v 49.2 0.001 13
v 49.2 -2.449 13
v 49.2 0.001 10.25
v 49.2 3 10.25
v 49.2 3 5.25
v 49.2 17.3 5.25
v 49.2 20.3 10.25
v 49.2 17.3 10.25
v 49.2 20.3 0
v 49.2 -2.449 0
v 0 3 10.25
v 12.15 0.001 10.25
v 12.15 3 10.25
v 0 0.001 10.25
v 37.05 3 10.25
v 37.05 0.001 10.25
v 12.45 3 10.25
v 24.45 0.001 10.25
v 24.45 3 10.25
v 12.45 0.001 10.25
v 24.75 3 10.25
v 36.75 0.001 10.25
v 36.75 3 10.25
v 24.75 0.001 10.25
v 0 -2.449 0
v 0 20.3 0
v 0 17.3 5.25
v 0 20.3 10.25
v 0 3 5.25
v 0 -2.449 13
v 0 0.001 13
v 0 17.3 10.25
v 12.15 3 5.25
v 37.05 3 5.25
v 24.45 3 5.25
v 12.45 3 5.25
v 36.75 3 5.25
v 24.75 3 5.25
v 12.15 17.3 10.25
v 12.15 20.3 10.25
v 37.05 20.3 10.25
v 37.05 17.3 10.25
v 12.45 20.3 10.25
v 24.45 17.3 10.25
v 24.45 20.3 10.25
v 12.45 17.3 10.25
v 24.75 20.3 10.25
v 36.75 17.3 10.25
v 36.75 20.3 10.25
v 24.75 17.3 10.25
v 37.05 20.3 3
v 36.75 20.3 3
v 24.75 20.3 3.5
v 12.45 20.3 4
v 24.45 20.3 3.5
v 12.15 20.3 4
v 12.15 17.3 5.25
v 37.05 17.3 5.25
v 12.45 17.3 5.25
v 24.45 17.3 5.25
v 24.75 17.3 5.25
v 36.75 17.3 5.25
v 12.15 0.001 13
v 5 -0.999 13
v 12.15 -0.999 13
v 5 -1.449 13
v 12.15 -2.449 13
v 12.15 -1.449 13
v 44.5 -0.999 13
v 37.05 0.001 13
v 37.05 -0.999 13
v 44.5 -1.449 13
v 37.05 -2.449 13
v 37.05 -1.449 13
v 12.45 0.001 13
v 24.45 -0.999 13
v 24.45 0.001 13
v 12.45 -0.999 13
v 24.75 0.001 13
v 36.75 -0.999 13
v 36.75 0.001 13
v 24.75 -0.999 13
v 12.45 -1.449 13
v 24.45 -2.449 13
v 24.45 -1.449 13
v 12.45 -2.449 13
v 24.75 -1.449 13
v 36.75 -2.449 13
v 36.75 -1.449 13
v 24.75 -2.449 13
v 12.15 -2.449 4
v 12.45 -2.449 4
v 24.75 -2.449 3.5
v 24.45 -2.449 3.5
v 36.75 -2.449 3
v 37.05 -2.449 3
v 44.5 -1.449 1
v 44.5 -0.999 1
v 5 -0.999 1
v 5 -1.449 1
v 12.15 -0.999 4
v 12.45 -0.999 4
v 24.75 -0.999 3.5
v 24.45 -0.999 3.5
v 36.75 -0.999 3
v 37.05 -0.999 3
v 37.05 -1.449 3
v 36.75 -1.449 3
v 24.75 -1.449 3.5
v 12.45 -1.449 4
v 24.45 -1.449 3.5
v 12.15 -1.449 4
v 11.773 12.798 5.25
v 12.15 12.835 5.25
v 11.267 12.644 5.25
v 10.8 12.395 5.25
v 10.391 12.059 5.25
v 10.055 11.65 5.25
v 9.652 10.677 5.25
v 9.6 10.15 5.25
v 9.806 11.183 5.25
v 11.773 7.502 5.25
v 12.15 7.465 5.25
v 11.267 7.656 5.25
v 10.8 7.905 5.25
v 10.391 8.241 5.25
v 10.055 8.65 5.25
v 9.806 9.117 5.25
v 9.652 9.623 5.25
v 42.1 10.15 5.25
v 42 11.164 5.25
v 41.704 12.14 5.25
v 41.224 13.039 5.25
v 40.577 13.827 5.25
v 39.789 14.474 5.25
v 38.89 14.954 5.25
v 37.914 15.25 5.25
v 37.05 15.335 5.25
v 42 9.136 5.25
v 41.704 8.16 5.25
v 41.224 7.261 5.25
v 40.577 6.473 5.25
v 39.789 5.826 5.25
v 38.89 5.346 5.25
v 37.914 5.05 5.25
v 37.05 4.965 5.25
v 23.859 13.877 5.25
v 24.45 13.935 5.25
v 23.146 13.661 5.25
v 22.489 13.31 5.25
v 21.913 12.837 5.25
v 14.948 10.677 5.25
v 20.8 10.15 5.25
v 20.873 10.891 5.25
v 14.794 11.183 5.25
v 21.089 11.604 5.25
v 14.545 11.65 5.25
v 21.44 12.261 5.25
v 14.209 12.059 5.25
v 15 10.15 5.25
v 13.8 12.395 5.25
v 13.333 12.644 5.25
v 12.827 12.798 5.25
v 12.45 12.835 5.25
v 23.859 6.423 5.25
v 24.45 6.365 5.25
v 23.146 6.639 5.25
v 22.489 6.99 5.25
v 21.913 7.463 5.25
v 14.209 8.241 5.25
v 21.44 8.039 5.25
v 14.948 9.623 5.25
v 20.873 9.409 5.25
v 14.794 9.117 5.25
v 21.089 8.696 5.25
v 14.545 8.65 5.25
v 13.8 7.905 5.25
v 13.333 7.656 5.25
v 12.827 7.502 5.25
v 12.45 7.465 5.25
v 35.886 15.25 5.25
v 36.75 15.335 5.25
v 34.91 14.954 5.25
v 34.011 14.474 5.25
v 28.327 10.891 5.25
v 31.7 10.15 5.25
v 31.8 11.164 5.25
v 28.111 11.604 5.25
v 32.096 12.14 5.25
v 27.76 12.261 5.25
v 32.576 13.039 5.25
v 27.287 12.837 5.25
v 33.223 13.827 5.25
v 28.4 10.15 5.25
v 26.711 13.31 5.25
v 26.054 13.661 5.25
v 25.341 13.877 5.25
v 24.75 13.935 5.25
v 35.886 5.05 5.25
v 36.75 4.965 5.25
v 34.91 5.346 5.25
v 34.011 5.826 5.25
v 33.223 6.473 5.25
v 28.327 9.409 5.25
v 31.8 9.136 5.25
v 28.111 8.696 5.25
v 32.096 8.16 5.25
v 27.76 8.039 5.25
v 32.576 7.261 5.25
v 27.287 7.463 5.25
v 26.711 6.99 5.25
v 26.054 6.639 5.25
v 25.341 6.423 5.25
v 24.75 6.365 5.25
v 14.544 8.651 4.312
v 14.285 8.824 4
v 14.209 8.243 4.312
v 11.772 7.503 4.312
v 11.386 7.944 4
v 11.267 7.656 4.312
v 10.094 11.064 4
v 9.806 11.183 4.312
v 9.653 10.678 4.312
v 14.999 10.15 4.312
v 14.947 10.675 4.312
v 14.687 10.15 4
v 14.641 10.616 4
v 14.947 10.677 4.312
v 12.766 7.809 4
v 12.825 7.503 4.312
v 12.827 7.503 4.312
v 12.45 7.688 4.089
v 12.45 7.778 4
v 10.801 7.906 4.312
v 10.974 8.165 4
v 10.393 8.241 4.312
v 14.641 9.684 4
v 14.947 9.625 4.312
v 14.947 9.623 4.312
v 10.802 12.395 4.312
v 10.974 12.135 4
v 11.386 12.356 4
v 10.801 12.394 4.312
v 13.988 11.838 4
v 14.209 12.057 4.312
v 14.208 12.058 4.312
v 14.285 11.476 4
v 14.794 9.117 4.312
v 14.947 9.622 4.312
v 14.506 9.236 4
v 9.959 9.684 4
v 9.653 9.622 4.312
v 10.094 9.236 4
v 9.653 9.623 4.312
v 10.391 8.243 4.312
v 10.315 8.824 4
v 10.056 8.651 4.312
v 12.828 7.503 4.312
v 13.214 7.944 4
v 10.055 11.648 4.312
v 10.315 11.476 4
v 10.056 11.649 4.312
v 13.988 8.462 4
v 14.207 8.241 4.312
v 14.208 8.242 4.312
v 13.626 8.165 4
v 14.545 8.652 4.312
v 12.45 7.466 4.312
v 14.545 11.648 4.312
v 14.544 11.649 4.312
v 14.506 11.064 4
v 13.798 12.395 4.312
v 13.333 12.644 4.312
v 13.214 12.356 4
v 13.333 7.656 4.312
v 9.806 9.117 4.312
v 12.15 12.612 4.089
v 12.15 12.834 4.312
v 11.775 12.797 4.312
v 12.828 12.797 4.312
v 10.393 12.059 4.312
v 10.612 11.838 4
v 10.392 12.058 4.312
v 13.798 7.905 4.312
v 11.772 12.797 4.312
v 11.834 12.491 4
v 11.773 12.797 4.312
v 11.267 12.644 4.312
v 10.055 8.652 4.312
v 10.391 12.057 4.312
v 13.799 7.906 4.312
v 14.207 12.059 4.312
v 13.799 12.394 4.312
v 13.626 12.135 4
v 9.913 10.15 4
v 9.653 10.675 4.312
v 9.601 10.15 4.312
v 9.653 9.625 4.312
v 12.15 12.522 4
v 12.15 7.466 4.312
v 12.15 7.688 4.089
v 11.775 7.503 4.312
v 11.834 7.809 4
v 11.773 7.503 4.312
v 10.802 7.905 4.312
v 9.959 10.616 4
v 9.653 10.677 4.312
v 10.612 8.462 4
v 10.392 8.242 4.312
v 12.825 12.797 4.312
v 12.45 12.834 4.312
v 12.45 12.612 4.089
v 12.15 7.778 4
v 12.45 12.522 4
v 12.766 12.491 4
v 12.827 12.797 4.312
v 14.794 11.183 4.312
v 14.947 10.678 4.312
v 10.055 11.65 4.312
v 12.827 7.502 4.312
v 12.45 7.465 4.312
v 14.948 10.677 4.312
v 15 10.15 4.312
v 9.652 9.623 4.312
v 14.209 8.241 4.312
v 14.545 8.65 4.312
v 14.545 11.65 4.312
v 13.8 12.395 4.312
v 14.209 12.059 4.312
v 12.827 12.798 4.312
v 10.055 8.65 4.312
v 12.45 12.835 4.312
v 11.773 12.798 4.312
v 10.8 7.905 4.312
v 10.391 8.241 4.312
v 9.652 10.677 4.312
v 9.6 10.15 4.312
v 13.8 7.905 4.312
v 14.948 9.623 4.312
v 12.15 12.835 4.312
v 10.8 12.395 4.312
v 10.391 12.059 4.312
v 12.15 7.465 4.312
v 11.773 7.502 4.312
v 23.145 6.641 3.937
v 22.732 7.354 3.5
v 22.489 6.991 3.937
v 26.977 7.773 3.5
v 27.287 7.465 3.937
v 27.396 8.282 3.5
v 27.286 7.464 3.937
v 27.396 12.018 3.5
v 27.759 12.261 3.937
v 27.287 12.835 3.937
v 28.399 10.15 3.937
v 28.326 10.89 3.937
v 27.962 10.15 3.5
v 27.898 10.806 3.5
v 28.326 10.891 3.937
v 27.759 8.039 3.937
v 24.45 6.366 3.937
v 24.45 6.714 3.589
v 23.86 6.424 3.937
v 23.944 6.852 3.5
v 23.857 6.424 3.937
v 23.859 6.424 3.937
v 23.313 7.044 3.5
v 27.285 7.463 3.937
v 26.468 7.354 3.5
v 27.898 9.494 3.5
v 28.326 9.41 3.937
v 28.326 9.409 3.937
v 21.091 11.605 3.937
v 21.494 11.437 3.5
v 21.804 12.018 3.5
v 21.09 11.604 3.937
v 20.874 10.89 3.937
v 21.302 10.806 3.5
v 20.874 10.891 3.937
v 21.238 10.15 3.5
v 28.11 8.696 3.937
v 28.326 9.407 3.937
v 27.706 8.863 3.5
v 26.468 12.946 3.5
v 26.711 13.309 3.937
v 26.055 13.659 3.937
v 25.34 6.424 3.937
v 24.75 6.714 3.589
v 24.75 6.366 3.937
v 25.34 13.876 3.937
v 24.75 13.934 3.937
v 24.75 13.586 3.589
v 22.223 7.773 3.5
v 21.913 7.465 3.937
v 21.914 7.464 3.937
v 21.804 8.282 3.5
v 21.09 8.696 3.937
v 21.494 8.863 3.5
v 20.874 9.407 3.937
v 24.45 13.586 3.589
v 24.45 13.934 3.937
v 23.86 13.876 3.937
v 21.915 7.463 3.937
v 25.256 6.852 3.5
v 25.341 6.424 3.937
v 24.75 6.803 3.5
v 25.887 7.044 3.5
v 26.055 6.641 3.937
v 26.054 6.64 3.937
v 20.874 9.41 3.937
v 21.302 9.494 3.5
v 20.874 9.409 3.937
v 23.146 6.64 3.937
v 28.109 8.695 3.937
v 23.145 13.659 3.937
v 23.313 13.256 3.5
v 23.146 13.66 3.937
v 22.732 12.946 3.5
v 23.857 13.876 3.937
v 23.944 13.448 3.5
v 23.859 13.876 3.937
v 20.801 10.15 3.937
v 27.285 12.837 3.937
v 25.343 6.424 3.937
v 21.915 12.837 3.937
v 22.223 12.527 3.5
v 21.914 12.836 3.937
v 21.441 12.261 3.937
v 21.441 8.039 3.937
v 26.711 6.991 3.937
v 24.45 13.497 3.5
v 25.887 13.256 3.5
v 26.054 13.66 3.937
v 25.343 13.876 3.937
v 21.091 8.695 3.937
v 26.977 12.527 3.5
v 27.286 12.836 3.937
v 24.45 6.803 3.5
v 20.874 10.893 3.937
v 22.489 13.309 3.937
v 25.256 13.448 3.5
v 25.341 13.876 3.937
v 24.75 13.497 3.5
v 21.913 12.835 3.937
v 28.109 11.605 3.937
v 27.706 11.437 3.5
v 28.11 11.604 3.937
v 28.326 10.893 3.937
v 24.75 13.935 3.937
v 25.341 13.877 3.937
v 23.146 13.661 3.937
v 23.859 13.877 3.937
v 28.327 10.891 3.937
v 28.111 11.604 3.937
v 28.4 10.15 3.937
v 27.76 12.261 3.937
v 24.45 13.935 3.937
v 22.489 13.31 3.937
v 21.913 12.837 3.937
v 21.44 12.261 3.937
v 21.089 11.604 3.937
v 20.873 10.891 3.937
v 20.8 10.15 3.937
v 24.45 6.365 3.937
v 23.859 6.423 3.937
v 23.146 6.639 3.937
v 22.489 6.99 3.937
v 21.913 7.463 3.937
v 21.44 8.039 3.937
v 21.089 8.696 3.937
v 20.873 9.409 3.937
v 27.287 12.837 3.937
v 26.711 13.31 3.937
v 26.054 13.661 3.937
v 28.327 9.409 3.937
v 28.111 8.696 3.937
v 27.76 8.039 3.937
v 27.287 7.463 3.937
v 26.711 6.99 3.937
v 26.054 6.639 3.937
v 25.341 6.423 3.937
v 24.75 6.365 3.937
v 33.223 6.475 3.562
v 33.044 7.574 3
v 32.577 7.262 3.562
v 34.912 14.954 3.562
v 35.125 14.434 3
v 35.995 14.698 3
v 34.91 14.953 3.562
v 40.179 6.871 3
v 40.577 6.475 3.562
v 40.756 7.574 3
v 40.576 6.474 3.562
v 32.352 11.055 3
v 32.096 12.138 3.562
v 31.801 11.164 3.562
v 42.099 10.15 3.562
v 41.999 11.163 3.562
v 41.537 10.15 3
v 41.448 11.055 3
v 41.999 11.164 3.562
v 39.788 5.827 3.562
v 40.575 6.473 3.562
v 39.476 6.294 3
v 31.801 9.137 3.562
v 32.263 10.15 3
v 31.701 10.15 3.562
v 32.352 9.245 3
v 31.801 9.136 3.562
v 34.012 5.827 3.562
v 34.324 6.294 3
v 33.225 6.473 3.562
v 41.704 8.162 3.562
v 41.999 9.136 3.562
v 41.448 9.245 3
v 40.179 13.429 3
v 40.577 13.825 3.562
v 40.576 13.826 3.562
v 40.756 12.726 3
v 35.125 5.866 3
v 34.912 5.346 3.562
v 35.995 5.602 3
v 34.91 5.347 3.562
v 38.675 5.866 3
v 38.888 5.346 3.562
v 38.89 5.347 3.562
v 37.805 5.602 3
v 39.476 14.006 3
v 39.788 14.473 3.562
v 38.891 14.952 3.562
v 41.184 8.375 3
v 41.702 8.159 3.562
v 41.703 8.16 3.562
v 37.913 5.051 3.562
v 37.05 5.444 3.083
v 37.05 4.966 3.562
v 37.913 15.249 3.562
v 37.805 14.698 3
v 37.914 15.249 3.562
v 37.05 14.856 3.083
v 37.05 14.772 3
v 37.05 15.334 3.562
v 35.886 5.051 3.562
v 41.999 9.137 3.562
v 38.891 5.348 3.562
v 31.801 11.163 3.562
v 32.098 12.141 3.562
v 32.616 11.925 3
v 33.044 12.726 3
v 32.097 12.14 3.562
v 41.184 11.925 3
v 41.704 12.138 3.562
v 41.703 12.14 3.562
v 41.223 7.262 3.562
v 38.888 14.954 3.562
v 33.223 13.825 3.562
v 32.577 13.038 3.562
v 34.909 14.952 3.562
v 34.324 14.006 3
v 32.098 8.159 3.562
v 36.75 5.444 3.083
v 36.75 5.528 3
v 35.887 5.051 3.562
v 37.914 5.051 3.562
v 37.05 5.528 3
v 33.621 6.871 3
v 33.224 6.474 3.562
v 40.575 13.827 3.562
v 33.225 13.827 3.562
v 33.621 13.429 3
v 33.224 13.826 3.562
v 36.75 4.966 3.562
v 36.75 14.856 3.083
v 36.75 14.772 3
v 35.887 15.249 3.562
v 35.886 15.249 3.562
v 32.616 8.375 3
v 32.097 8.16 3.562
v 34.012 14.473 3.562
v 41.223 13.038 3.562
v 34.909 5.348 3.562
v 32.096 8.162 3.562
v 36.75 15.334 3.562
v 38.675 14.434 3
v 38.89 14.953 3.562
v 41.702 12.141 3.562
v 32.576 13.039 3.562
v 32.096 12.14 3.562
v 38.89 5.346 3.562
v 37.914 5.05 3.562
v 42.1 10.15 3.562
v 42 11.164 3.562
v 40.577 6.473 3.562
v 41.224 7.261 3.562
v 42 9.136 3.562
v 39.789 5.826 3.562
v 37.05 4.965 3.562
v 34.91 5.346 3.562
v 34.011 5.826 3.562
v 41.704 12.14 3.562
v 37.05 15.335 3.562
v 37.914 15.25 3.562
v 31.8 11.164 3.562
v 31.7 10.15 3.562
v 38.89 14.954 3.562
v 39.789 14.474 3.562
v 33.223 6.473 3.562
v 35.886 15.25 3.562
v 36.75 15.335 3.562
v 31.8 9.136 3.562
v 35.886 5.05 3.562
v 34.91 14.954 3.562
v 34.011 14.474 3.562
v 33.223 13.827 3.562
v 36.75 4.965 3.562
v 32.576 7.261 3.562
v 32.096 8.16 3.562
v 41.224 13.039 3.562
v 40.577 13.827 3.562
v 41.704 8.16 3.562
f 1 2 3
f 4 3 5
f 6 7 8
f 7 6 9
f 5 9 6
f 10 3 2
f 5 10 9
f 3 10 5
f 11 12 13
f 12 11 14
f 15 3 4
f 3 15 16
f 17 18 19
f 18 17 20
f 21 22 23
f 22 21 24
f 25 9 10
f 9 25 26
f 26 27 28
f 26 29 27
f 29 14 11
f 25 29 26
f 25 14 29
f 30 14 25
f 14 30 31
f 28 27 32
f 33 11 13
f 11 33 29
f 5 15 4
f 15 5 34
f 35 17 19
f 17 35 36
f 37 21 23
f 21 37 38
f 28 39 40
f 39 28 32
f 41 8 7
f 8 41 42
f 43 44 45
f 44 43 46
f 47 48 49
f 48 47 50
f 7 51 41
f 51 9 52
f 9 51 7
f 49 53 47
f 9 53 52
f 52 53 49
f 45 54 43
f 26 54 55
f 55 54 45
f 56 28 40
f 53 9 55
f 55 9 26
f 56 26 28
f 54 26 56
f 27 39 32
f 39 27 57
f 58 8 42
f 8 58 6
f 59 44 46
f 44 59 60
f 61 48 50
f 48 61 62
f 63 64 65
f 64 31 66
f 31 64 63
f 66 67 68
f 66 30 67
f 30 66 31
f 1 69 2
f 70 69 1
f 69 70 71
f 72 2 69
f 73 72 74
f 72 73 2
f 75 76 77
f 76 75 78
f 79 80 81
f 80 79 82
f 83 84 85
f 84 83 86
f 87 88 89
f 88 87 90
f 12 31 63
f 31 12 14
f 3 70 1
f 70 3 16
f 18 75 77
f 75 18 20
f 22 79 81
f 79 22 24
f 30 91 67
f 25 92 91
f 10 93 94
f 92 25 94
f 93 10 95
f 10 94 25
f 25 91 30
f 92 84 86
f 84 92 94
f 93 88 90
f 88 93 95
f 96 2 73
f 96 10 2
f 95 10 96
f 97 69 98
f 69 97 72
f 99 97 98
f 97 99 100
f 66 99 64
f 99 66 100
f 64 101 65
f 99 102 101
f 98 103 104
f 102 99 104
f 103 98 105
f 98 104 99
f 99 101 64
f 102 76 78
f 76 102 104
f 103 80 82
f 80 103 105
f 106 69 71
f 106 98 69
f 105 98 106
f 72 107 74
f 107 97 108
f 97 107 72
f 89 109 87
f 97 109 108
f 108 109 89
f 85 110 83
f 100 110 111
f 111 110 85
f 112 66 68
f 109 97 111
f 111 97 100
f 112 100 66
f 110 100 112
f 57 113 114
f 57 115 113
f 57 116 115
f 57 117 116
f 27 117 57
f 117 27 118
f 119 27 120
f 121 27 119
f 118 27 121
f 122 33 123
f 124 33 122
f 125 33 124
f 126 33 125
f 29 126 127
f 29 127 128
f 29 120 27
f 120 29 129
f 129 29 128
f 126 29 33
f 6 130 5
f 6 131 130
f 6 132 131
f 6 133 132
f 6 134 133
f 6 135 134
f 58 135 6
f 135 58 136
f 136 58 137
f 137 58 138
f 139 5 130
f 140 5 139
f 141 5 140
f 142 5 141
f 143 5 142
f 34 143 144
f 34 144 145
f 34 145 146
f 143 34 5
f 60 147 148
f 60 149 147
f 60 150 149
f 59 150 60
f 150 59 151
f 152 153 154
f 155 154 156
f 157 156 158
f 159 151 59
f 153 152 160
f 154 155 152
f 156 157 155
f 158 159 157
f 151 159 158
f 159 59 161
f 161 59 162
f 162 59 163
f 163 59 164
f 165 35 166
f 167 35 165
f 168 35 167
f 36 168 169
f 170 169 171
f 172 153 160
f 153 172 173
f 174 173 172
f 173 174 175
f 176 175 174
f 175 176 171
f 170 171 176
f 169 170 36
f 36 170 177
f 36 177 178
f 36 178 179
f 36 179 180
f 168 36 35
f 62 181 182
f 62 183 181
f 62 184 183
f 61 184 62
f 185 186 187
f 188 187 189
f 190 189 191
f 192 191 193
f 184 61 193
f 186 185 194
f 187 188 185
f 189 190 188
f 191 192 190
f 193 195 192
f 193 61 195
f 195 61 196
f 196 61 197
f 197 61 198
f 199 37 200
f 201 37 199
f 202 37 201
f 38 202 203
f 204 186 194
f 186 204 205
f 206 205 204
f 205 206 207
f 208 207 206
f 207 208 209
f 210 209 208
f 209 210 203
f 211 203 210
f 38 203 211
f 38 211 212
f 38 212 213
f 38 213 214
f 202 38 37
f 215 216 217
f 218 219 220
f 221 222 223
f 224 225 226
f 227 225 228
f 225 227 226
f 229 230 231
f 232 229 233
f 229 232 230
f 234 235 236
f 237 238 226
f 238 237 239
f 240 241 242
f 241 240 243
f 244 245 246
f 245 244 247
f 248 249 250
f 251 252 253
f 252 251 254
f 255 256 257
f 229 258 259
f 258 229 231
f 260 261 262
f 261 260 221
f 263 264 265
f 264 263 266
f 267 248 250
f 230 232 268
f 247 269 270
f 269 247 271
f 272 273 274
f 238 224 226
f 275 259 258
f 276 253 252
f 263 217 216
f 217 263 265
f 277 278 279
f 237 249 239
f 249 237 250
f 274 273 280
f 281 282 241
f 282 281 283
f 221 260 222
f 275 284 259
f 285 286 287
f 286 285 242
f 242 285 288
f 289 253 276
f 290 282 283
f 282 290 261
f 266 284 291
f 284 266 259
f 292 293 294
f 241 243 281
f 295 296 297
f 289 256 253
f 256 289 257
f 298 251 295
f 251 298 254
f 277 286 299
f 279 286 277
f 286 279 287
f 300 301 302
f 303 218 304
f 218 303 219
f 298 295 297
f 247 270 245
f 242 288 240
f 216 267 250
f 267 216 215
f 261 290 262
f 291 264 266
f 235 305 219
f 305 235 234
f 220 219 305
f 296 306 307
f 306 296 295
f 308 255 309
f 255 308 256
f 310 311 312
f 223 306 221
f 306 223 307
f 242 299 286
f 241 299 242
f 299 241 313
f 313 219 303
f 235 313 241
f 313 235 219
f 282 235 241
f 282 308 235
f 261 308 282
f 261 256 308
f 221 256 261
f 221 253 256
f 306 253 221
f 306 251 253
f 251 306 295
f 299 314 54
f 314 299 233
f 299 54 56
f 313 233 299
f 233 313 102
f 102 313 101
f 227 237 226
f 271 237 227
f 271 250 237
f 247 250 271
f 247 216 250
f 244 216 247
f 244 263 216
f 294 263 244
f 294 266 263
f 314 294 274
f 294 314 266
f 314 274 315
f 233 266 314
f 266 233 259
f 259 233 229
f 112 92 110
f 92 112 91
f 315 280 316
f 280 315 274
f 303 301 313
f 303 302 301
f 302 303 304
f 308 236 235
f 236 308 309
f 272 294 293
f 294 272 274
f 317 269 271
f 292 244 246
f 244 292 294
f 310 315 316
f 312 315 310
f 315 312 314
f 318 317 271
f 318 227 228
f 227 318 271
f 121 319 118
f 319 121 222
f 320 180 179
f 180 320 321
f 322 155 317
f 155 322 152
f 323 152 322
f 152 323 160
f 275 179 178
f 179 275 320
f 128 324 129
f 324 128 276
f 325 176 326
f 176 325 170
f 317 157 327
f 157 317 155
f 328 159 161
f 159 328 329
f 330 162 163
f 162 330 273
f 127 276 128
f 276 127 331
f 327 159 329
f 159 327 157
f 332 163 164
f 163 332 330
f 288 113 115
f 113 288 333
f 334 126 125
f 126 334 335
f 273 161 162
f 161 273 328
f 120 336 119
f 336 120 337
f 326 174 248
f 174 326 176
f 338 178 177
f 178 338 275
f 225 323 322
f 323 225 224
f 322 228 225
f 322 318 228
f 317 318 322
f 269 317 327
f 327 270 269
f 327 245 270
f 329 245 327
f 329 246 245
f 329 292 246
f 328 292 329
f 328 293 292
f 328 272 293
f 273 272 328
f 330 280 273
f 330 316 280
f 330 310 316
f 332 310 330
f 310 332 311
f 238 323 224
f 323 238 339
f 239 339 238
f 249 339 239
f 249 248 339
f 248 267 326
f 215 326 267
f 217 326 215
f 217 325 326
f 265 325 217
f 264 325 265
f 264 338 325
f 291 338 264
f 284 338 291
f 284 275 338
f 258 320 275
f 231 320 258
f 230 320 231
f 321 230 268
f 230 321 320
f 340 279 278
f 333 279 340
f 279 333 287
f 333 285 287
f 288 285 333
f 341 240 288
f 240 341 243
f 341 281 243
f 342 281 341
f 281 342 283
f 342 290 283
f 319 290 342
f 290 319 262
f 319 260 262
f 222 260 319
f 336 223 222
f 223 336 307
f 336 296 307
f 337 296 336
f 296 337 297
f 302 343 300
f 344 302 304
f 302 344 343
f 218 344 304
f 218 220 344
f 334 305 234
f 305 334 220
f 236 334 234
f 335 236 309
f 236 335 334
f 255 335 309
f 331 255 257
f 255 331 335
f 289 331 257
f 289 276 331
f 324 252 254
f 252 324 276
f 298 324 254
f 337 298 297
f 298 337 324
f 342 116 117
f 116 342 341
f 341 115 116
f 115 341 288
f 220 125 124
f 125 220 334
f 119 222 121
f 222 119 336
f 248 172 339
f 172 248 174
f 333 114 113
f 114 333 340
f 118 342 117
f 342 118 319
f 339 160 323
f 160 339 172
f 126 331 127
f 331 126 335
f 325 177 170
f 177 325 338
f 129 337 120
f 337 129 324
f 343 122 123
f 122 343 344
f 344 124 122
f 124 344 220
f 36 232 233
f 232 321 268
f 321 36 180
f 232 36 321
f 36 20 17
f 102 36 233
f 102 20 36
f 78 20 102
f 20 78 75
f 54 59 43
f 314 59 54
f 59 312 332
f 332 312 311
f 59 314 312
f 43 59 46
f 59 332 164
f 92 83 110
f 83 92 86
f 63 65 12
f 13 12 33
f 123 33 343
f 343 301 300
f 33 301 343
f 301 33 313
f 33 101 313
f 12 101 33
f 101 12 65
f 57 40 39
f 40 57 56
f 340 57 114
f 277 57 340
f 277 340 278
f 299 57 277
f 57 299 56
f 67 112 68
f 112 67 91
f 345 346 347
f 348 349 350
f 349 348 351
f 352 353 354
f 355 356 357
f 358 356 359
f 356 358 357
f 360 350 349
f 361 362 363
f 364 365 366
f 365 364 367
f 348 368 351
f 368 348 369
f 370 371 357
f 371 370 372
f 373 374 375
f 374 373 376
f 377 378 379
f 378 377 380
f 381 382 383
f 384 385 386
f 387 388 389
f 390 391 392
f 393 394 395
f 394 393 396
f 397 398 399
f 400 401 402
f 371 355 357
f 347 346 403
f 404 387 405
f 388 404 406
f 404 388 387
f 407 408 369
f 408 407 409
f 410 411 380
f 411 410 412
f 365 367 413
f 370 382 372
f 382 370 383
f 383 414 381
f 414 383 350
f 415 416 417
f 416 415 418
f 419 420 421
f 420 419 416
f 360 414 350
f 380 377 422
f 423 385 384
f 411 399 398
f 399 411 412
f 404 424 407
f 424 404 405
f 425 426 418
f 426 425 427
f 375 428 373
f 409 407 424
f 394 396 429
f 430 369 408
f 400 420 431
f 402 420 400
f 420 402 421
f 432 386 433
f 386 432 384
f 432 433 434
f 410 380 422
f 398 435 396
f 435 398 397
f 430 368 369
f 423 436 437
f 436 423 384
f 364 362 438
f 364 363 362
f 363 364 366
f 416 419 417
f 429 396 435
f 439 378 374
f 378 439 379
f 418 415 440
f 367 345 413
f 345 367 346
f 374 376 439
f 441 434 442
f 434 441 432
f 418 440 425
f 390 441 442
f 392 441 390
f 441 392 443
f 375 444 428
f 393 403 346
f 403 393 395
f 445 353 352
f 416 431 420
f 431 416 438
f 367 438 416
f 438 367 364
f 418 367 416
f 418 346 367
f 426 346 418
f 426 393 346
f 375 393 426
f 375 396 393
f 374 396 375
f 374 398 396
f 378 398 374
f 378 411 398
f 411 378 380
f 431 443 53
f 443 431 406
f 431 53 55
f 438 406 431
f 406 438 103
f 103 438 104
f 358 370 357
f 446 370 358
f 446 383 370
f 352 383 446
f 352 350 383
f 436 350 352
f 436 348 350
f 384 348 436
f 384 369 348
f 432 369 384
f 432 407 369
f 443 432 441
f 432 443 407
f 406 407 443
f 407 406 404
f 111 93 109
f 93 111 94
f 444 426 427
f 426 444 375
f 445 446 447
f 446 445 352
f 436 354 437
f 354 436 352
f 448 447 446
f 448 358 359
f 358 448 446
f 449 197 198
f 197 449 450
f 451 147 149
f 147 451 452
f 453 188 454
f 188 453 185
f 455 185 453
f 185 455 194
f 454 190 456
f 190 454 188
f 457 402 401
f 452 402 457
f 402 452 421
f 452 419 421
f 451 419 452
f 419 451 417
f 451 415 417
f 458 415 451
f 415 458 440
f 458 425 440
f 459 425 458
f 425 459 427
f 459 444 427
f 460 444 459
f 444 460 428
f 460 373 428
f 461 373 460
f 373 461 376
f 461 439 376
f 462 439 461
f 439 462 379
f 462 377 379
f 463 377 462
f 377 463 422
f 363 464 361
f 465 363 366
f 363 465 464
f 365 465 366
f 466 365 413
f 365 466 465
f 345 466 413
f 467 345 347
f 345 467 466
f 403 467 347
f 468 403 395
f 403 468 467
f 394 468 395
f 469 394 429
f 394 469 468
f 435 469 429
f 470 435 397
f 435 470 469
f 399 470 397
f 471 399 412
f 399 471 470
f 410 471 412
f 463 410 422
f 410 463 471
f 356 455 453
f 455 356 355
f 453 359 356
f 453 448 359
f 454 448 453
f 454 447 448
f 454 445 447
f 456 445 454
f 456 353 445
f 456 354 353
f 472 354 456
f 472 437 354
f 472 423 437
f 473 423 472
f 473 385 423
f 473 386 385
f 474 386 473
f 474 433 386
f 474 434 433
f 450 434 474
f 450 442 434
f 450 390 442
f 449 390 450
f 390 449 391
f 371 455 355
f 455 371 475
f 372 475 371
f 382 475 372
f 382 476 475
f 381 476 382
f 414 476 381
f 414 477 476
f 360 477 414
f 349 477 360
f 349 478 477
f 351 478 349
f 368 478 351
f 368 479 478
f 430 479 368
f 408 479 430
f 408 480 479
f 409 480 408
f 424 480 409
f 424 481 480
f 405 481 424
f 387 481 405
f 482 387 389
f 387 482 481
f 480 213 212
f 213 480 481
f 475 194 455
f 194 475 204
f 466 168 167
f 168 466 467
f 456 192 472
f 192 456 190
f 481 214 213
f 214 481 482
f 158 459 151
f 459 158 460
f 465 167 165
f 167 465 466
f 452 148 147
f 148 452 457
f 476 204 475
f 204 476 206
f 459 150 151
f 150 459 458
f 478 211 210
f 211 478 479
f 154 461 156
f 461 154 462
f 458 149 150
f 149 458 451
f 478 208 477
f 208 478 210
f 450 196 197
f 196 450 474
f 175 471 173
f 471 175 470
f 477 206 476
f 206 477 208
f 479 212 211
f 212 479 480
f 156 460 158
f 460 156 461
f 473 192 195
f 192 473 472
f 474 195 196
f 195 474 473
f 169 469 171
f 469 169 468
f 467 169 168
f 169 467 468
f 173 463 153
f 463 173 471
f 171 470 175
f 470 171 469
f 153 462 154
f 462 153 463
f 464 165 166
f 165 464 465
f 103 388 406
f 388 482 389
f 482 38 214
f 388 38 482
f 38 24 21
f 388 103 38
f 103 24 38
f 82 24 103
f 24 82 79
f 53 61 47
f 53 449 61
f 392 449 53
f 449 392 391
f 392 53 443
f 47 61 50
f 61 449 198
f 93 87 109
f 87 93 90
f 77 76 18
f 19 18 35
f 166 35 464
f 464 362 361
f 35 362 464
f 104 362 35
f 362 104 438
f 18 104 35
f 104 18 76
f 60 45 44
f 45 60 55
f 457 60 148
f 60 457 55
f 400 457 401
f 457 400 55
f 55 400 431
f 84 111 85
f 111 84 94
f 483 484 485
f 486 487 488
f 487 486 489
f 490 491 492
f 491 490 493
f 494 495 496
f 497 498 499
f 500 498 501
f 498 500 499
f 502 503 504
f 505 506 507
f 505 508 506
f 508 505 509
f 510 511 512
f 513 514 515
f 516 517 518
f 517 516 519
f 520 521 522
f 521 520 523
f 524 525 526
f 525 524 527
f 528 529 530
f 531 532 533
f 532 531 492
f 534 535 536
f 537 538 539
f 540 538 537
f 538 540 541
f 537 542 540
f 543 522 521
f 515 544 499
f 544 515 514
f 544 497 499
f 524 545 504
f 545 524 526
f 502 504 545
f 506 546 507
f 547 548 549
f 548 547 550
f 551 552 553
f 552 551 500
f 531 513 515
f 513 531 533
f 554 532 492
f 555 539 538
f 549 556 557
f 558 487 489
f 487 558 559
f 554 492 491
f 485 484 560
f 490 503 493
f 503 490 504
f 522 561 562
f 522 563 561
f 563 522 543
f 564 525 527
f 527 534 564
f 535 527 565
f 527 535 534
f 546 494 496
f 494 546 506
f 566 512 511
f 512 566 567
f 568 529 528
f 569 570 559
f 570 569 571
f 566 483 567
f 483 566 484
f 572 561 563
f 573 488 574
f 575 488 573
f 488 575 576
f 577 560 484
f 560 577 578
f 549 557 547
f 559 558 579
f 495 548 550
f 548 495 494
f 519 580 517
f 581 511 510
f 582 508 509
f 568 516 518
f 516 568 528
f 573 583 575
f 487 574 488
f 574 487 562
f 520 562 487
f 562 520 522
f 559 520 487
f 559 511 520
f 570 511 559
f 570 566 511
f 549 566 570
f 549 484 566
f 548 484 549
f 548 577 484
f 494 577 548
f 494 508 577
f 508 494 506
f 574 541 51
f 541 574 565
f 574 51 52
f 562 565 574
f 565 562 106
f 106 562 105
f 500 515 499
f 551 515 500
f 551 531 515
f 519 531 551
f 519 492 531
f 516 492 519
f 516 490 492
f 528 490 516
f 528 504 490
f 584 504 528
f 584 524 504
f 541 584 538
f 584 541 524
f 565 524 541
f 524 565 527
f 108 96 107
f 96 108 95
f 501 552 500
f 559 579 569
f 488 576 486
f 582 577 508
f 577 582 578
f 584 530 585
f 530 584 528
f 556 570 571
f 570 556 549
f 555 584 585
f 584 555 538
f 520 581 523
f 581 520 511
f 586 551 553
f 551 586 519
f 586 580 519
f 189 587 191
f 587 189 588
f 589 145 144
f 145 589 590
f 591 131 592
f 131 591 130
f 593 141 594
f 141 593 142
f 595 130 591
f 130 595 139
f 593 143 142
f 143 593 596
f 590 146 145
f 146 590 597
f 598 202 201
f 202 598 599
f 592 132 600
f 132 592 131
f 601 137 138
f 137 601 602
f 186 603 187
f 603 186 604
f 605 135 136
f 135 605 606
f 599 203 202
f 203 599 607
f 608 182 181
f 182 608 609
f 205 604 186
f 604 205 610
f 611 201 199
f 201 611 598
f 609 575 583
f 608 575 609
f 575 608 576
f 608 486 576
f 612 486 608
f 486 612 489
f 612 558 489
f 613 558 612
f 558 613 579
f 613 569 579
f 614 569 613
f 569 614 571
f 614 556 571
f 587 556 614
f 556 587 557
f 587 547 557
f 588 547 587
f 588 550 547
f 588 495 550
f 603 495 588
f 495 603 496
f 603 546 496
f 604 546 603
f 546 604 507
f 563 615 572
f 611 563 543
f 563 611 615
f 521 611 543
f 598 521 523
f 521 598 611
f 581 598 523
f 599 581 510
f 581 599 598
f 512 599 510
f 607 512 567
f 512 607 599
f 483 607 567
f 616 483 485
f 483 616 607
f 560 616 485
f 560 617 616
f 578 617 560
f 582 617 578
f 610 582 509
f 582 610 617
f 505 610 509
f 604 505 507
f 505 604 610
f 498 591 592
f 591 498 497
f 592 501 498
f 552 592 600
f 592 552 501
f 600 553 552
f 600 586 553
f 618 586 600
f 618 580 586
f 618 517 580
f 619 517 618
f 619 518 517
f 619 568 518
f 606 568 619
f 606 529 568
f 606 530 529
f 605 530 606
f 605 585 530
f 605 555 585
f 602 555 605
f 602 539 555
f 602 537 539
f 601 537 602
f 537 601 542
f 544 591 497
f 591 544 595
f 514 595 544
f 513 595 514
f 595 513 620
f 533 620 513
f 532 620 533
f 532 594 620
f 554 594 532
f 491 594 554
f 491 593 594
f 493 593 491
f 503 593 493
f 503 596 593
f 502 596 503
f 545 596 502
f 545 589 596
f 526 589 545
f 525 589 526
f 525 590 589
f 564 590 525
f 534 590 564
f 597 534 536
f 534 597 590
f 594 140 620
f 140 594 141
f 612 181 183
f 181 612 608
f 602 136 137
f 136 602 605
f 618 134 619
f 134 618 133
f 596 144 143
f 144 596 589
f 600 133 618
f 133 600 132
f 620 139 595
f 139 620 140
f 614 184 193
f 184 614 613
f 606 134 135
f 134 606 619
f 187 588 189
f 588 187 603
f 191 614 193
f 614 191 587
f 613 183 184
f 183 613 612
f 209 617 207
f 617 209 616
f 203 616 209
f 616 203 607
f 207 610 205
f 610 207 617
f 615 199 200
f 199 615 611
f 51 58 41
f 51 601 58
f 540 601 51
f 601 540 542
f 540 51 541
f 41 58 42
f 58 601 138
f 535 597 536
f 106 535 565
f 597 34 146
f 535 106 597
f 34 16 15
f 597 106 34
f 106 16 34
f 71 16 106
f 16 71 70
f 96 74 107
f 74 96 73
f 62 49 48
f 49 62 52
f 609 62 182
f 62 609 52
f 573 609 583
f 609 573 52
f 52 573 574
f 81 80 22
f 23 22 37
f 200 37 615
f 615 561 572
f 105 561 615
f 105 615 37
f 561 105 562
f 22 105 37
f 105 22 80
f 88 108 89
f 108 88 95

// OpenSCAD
baseThickness = 3;
pillDiameters = [ 5.3, 7.5, 10.3 ];
pillDepths = [ 1.25, 1.75, 2.25 ];
miterHeight = 5;
miterWidth = 3;
razorThickness = 0.2;
spacing = 2;
razorTolerance = 0.05;
razorLength = 39;
razorHolderHeight = 12;
razorHolderOffset = 1;
razorHolderWidth = 1;
holderTolerance = 0.25;
tolerance = 0.1;

module dummy() {}

miterSlit = razorThickness + 2*razorTolerance;
nudge = 0.001;

function sum(v,n=undef,pos=0,soFar=0) = pos>=(n==undef?len(v):n) ? soFar :
            sum(v,n=n,pos=pos+1,soFar=soFar+v[pos]);

n = len(pillDiameters);
maxDiameter = max(pillDiameters);
dx = spacing+maxDiameter;
length = max((n+1)*dx,razorLength+2*holderTolerance+2*razorHolderWidth);
depth = max(pillDepths);
height = baseThickness+depth;
width = max(pillDiameters)+2*spacing+2*miterWidth;

module solid() {
    cube([length,width,height]);
    for(y=[0,width-miterWidth]) translate([0,y,0]) cube([length,miterWidth,miterHeight+height]);
    holder();
}

module adjCyl(d=10,h=10) {
    $fn = 32;
    cylinder(d1=d-h/2,d2=d,h=h/4);
    translate([0,0,h/4-nudge]) cylinder(d=d,h=3*h/4+nudge);
}

difference() {
    solid();
    for(i=[0:n-1]) translate([dx+i*dx,width/2,height-pillDepths[i]]) { 
adjCyl(d=pillDiameters[i]+tolerance,h=pillDepths[i]+nudge);
        translate([-miterSlit/2,-width-100,0]) cube([miterSlit,width*3+300,miterHeight+nudge+300]);
    }
}

module holder() {
    slit = razorThickness + holderTolerance;
    w = razorHolderOffset+razorHolderWidth+slit;
translate([0,-w+nudge,0])
difference() {
    cube([length,w,razorHolderHeight+razorHolderWidth]);
    translate([(length-(razorLength+2*tolerance))/2,razorHolderWidth,razorHolderWidth])
    cube([razorLength+2*holderTolerance,slit,razorHolderHeight+nudge]);
}
}
